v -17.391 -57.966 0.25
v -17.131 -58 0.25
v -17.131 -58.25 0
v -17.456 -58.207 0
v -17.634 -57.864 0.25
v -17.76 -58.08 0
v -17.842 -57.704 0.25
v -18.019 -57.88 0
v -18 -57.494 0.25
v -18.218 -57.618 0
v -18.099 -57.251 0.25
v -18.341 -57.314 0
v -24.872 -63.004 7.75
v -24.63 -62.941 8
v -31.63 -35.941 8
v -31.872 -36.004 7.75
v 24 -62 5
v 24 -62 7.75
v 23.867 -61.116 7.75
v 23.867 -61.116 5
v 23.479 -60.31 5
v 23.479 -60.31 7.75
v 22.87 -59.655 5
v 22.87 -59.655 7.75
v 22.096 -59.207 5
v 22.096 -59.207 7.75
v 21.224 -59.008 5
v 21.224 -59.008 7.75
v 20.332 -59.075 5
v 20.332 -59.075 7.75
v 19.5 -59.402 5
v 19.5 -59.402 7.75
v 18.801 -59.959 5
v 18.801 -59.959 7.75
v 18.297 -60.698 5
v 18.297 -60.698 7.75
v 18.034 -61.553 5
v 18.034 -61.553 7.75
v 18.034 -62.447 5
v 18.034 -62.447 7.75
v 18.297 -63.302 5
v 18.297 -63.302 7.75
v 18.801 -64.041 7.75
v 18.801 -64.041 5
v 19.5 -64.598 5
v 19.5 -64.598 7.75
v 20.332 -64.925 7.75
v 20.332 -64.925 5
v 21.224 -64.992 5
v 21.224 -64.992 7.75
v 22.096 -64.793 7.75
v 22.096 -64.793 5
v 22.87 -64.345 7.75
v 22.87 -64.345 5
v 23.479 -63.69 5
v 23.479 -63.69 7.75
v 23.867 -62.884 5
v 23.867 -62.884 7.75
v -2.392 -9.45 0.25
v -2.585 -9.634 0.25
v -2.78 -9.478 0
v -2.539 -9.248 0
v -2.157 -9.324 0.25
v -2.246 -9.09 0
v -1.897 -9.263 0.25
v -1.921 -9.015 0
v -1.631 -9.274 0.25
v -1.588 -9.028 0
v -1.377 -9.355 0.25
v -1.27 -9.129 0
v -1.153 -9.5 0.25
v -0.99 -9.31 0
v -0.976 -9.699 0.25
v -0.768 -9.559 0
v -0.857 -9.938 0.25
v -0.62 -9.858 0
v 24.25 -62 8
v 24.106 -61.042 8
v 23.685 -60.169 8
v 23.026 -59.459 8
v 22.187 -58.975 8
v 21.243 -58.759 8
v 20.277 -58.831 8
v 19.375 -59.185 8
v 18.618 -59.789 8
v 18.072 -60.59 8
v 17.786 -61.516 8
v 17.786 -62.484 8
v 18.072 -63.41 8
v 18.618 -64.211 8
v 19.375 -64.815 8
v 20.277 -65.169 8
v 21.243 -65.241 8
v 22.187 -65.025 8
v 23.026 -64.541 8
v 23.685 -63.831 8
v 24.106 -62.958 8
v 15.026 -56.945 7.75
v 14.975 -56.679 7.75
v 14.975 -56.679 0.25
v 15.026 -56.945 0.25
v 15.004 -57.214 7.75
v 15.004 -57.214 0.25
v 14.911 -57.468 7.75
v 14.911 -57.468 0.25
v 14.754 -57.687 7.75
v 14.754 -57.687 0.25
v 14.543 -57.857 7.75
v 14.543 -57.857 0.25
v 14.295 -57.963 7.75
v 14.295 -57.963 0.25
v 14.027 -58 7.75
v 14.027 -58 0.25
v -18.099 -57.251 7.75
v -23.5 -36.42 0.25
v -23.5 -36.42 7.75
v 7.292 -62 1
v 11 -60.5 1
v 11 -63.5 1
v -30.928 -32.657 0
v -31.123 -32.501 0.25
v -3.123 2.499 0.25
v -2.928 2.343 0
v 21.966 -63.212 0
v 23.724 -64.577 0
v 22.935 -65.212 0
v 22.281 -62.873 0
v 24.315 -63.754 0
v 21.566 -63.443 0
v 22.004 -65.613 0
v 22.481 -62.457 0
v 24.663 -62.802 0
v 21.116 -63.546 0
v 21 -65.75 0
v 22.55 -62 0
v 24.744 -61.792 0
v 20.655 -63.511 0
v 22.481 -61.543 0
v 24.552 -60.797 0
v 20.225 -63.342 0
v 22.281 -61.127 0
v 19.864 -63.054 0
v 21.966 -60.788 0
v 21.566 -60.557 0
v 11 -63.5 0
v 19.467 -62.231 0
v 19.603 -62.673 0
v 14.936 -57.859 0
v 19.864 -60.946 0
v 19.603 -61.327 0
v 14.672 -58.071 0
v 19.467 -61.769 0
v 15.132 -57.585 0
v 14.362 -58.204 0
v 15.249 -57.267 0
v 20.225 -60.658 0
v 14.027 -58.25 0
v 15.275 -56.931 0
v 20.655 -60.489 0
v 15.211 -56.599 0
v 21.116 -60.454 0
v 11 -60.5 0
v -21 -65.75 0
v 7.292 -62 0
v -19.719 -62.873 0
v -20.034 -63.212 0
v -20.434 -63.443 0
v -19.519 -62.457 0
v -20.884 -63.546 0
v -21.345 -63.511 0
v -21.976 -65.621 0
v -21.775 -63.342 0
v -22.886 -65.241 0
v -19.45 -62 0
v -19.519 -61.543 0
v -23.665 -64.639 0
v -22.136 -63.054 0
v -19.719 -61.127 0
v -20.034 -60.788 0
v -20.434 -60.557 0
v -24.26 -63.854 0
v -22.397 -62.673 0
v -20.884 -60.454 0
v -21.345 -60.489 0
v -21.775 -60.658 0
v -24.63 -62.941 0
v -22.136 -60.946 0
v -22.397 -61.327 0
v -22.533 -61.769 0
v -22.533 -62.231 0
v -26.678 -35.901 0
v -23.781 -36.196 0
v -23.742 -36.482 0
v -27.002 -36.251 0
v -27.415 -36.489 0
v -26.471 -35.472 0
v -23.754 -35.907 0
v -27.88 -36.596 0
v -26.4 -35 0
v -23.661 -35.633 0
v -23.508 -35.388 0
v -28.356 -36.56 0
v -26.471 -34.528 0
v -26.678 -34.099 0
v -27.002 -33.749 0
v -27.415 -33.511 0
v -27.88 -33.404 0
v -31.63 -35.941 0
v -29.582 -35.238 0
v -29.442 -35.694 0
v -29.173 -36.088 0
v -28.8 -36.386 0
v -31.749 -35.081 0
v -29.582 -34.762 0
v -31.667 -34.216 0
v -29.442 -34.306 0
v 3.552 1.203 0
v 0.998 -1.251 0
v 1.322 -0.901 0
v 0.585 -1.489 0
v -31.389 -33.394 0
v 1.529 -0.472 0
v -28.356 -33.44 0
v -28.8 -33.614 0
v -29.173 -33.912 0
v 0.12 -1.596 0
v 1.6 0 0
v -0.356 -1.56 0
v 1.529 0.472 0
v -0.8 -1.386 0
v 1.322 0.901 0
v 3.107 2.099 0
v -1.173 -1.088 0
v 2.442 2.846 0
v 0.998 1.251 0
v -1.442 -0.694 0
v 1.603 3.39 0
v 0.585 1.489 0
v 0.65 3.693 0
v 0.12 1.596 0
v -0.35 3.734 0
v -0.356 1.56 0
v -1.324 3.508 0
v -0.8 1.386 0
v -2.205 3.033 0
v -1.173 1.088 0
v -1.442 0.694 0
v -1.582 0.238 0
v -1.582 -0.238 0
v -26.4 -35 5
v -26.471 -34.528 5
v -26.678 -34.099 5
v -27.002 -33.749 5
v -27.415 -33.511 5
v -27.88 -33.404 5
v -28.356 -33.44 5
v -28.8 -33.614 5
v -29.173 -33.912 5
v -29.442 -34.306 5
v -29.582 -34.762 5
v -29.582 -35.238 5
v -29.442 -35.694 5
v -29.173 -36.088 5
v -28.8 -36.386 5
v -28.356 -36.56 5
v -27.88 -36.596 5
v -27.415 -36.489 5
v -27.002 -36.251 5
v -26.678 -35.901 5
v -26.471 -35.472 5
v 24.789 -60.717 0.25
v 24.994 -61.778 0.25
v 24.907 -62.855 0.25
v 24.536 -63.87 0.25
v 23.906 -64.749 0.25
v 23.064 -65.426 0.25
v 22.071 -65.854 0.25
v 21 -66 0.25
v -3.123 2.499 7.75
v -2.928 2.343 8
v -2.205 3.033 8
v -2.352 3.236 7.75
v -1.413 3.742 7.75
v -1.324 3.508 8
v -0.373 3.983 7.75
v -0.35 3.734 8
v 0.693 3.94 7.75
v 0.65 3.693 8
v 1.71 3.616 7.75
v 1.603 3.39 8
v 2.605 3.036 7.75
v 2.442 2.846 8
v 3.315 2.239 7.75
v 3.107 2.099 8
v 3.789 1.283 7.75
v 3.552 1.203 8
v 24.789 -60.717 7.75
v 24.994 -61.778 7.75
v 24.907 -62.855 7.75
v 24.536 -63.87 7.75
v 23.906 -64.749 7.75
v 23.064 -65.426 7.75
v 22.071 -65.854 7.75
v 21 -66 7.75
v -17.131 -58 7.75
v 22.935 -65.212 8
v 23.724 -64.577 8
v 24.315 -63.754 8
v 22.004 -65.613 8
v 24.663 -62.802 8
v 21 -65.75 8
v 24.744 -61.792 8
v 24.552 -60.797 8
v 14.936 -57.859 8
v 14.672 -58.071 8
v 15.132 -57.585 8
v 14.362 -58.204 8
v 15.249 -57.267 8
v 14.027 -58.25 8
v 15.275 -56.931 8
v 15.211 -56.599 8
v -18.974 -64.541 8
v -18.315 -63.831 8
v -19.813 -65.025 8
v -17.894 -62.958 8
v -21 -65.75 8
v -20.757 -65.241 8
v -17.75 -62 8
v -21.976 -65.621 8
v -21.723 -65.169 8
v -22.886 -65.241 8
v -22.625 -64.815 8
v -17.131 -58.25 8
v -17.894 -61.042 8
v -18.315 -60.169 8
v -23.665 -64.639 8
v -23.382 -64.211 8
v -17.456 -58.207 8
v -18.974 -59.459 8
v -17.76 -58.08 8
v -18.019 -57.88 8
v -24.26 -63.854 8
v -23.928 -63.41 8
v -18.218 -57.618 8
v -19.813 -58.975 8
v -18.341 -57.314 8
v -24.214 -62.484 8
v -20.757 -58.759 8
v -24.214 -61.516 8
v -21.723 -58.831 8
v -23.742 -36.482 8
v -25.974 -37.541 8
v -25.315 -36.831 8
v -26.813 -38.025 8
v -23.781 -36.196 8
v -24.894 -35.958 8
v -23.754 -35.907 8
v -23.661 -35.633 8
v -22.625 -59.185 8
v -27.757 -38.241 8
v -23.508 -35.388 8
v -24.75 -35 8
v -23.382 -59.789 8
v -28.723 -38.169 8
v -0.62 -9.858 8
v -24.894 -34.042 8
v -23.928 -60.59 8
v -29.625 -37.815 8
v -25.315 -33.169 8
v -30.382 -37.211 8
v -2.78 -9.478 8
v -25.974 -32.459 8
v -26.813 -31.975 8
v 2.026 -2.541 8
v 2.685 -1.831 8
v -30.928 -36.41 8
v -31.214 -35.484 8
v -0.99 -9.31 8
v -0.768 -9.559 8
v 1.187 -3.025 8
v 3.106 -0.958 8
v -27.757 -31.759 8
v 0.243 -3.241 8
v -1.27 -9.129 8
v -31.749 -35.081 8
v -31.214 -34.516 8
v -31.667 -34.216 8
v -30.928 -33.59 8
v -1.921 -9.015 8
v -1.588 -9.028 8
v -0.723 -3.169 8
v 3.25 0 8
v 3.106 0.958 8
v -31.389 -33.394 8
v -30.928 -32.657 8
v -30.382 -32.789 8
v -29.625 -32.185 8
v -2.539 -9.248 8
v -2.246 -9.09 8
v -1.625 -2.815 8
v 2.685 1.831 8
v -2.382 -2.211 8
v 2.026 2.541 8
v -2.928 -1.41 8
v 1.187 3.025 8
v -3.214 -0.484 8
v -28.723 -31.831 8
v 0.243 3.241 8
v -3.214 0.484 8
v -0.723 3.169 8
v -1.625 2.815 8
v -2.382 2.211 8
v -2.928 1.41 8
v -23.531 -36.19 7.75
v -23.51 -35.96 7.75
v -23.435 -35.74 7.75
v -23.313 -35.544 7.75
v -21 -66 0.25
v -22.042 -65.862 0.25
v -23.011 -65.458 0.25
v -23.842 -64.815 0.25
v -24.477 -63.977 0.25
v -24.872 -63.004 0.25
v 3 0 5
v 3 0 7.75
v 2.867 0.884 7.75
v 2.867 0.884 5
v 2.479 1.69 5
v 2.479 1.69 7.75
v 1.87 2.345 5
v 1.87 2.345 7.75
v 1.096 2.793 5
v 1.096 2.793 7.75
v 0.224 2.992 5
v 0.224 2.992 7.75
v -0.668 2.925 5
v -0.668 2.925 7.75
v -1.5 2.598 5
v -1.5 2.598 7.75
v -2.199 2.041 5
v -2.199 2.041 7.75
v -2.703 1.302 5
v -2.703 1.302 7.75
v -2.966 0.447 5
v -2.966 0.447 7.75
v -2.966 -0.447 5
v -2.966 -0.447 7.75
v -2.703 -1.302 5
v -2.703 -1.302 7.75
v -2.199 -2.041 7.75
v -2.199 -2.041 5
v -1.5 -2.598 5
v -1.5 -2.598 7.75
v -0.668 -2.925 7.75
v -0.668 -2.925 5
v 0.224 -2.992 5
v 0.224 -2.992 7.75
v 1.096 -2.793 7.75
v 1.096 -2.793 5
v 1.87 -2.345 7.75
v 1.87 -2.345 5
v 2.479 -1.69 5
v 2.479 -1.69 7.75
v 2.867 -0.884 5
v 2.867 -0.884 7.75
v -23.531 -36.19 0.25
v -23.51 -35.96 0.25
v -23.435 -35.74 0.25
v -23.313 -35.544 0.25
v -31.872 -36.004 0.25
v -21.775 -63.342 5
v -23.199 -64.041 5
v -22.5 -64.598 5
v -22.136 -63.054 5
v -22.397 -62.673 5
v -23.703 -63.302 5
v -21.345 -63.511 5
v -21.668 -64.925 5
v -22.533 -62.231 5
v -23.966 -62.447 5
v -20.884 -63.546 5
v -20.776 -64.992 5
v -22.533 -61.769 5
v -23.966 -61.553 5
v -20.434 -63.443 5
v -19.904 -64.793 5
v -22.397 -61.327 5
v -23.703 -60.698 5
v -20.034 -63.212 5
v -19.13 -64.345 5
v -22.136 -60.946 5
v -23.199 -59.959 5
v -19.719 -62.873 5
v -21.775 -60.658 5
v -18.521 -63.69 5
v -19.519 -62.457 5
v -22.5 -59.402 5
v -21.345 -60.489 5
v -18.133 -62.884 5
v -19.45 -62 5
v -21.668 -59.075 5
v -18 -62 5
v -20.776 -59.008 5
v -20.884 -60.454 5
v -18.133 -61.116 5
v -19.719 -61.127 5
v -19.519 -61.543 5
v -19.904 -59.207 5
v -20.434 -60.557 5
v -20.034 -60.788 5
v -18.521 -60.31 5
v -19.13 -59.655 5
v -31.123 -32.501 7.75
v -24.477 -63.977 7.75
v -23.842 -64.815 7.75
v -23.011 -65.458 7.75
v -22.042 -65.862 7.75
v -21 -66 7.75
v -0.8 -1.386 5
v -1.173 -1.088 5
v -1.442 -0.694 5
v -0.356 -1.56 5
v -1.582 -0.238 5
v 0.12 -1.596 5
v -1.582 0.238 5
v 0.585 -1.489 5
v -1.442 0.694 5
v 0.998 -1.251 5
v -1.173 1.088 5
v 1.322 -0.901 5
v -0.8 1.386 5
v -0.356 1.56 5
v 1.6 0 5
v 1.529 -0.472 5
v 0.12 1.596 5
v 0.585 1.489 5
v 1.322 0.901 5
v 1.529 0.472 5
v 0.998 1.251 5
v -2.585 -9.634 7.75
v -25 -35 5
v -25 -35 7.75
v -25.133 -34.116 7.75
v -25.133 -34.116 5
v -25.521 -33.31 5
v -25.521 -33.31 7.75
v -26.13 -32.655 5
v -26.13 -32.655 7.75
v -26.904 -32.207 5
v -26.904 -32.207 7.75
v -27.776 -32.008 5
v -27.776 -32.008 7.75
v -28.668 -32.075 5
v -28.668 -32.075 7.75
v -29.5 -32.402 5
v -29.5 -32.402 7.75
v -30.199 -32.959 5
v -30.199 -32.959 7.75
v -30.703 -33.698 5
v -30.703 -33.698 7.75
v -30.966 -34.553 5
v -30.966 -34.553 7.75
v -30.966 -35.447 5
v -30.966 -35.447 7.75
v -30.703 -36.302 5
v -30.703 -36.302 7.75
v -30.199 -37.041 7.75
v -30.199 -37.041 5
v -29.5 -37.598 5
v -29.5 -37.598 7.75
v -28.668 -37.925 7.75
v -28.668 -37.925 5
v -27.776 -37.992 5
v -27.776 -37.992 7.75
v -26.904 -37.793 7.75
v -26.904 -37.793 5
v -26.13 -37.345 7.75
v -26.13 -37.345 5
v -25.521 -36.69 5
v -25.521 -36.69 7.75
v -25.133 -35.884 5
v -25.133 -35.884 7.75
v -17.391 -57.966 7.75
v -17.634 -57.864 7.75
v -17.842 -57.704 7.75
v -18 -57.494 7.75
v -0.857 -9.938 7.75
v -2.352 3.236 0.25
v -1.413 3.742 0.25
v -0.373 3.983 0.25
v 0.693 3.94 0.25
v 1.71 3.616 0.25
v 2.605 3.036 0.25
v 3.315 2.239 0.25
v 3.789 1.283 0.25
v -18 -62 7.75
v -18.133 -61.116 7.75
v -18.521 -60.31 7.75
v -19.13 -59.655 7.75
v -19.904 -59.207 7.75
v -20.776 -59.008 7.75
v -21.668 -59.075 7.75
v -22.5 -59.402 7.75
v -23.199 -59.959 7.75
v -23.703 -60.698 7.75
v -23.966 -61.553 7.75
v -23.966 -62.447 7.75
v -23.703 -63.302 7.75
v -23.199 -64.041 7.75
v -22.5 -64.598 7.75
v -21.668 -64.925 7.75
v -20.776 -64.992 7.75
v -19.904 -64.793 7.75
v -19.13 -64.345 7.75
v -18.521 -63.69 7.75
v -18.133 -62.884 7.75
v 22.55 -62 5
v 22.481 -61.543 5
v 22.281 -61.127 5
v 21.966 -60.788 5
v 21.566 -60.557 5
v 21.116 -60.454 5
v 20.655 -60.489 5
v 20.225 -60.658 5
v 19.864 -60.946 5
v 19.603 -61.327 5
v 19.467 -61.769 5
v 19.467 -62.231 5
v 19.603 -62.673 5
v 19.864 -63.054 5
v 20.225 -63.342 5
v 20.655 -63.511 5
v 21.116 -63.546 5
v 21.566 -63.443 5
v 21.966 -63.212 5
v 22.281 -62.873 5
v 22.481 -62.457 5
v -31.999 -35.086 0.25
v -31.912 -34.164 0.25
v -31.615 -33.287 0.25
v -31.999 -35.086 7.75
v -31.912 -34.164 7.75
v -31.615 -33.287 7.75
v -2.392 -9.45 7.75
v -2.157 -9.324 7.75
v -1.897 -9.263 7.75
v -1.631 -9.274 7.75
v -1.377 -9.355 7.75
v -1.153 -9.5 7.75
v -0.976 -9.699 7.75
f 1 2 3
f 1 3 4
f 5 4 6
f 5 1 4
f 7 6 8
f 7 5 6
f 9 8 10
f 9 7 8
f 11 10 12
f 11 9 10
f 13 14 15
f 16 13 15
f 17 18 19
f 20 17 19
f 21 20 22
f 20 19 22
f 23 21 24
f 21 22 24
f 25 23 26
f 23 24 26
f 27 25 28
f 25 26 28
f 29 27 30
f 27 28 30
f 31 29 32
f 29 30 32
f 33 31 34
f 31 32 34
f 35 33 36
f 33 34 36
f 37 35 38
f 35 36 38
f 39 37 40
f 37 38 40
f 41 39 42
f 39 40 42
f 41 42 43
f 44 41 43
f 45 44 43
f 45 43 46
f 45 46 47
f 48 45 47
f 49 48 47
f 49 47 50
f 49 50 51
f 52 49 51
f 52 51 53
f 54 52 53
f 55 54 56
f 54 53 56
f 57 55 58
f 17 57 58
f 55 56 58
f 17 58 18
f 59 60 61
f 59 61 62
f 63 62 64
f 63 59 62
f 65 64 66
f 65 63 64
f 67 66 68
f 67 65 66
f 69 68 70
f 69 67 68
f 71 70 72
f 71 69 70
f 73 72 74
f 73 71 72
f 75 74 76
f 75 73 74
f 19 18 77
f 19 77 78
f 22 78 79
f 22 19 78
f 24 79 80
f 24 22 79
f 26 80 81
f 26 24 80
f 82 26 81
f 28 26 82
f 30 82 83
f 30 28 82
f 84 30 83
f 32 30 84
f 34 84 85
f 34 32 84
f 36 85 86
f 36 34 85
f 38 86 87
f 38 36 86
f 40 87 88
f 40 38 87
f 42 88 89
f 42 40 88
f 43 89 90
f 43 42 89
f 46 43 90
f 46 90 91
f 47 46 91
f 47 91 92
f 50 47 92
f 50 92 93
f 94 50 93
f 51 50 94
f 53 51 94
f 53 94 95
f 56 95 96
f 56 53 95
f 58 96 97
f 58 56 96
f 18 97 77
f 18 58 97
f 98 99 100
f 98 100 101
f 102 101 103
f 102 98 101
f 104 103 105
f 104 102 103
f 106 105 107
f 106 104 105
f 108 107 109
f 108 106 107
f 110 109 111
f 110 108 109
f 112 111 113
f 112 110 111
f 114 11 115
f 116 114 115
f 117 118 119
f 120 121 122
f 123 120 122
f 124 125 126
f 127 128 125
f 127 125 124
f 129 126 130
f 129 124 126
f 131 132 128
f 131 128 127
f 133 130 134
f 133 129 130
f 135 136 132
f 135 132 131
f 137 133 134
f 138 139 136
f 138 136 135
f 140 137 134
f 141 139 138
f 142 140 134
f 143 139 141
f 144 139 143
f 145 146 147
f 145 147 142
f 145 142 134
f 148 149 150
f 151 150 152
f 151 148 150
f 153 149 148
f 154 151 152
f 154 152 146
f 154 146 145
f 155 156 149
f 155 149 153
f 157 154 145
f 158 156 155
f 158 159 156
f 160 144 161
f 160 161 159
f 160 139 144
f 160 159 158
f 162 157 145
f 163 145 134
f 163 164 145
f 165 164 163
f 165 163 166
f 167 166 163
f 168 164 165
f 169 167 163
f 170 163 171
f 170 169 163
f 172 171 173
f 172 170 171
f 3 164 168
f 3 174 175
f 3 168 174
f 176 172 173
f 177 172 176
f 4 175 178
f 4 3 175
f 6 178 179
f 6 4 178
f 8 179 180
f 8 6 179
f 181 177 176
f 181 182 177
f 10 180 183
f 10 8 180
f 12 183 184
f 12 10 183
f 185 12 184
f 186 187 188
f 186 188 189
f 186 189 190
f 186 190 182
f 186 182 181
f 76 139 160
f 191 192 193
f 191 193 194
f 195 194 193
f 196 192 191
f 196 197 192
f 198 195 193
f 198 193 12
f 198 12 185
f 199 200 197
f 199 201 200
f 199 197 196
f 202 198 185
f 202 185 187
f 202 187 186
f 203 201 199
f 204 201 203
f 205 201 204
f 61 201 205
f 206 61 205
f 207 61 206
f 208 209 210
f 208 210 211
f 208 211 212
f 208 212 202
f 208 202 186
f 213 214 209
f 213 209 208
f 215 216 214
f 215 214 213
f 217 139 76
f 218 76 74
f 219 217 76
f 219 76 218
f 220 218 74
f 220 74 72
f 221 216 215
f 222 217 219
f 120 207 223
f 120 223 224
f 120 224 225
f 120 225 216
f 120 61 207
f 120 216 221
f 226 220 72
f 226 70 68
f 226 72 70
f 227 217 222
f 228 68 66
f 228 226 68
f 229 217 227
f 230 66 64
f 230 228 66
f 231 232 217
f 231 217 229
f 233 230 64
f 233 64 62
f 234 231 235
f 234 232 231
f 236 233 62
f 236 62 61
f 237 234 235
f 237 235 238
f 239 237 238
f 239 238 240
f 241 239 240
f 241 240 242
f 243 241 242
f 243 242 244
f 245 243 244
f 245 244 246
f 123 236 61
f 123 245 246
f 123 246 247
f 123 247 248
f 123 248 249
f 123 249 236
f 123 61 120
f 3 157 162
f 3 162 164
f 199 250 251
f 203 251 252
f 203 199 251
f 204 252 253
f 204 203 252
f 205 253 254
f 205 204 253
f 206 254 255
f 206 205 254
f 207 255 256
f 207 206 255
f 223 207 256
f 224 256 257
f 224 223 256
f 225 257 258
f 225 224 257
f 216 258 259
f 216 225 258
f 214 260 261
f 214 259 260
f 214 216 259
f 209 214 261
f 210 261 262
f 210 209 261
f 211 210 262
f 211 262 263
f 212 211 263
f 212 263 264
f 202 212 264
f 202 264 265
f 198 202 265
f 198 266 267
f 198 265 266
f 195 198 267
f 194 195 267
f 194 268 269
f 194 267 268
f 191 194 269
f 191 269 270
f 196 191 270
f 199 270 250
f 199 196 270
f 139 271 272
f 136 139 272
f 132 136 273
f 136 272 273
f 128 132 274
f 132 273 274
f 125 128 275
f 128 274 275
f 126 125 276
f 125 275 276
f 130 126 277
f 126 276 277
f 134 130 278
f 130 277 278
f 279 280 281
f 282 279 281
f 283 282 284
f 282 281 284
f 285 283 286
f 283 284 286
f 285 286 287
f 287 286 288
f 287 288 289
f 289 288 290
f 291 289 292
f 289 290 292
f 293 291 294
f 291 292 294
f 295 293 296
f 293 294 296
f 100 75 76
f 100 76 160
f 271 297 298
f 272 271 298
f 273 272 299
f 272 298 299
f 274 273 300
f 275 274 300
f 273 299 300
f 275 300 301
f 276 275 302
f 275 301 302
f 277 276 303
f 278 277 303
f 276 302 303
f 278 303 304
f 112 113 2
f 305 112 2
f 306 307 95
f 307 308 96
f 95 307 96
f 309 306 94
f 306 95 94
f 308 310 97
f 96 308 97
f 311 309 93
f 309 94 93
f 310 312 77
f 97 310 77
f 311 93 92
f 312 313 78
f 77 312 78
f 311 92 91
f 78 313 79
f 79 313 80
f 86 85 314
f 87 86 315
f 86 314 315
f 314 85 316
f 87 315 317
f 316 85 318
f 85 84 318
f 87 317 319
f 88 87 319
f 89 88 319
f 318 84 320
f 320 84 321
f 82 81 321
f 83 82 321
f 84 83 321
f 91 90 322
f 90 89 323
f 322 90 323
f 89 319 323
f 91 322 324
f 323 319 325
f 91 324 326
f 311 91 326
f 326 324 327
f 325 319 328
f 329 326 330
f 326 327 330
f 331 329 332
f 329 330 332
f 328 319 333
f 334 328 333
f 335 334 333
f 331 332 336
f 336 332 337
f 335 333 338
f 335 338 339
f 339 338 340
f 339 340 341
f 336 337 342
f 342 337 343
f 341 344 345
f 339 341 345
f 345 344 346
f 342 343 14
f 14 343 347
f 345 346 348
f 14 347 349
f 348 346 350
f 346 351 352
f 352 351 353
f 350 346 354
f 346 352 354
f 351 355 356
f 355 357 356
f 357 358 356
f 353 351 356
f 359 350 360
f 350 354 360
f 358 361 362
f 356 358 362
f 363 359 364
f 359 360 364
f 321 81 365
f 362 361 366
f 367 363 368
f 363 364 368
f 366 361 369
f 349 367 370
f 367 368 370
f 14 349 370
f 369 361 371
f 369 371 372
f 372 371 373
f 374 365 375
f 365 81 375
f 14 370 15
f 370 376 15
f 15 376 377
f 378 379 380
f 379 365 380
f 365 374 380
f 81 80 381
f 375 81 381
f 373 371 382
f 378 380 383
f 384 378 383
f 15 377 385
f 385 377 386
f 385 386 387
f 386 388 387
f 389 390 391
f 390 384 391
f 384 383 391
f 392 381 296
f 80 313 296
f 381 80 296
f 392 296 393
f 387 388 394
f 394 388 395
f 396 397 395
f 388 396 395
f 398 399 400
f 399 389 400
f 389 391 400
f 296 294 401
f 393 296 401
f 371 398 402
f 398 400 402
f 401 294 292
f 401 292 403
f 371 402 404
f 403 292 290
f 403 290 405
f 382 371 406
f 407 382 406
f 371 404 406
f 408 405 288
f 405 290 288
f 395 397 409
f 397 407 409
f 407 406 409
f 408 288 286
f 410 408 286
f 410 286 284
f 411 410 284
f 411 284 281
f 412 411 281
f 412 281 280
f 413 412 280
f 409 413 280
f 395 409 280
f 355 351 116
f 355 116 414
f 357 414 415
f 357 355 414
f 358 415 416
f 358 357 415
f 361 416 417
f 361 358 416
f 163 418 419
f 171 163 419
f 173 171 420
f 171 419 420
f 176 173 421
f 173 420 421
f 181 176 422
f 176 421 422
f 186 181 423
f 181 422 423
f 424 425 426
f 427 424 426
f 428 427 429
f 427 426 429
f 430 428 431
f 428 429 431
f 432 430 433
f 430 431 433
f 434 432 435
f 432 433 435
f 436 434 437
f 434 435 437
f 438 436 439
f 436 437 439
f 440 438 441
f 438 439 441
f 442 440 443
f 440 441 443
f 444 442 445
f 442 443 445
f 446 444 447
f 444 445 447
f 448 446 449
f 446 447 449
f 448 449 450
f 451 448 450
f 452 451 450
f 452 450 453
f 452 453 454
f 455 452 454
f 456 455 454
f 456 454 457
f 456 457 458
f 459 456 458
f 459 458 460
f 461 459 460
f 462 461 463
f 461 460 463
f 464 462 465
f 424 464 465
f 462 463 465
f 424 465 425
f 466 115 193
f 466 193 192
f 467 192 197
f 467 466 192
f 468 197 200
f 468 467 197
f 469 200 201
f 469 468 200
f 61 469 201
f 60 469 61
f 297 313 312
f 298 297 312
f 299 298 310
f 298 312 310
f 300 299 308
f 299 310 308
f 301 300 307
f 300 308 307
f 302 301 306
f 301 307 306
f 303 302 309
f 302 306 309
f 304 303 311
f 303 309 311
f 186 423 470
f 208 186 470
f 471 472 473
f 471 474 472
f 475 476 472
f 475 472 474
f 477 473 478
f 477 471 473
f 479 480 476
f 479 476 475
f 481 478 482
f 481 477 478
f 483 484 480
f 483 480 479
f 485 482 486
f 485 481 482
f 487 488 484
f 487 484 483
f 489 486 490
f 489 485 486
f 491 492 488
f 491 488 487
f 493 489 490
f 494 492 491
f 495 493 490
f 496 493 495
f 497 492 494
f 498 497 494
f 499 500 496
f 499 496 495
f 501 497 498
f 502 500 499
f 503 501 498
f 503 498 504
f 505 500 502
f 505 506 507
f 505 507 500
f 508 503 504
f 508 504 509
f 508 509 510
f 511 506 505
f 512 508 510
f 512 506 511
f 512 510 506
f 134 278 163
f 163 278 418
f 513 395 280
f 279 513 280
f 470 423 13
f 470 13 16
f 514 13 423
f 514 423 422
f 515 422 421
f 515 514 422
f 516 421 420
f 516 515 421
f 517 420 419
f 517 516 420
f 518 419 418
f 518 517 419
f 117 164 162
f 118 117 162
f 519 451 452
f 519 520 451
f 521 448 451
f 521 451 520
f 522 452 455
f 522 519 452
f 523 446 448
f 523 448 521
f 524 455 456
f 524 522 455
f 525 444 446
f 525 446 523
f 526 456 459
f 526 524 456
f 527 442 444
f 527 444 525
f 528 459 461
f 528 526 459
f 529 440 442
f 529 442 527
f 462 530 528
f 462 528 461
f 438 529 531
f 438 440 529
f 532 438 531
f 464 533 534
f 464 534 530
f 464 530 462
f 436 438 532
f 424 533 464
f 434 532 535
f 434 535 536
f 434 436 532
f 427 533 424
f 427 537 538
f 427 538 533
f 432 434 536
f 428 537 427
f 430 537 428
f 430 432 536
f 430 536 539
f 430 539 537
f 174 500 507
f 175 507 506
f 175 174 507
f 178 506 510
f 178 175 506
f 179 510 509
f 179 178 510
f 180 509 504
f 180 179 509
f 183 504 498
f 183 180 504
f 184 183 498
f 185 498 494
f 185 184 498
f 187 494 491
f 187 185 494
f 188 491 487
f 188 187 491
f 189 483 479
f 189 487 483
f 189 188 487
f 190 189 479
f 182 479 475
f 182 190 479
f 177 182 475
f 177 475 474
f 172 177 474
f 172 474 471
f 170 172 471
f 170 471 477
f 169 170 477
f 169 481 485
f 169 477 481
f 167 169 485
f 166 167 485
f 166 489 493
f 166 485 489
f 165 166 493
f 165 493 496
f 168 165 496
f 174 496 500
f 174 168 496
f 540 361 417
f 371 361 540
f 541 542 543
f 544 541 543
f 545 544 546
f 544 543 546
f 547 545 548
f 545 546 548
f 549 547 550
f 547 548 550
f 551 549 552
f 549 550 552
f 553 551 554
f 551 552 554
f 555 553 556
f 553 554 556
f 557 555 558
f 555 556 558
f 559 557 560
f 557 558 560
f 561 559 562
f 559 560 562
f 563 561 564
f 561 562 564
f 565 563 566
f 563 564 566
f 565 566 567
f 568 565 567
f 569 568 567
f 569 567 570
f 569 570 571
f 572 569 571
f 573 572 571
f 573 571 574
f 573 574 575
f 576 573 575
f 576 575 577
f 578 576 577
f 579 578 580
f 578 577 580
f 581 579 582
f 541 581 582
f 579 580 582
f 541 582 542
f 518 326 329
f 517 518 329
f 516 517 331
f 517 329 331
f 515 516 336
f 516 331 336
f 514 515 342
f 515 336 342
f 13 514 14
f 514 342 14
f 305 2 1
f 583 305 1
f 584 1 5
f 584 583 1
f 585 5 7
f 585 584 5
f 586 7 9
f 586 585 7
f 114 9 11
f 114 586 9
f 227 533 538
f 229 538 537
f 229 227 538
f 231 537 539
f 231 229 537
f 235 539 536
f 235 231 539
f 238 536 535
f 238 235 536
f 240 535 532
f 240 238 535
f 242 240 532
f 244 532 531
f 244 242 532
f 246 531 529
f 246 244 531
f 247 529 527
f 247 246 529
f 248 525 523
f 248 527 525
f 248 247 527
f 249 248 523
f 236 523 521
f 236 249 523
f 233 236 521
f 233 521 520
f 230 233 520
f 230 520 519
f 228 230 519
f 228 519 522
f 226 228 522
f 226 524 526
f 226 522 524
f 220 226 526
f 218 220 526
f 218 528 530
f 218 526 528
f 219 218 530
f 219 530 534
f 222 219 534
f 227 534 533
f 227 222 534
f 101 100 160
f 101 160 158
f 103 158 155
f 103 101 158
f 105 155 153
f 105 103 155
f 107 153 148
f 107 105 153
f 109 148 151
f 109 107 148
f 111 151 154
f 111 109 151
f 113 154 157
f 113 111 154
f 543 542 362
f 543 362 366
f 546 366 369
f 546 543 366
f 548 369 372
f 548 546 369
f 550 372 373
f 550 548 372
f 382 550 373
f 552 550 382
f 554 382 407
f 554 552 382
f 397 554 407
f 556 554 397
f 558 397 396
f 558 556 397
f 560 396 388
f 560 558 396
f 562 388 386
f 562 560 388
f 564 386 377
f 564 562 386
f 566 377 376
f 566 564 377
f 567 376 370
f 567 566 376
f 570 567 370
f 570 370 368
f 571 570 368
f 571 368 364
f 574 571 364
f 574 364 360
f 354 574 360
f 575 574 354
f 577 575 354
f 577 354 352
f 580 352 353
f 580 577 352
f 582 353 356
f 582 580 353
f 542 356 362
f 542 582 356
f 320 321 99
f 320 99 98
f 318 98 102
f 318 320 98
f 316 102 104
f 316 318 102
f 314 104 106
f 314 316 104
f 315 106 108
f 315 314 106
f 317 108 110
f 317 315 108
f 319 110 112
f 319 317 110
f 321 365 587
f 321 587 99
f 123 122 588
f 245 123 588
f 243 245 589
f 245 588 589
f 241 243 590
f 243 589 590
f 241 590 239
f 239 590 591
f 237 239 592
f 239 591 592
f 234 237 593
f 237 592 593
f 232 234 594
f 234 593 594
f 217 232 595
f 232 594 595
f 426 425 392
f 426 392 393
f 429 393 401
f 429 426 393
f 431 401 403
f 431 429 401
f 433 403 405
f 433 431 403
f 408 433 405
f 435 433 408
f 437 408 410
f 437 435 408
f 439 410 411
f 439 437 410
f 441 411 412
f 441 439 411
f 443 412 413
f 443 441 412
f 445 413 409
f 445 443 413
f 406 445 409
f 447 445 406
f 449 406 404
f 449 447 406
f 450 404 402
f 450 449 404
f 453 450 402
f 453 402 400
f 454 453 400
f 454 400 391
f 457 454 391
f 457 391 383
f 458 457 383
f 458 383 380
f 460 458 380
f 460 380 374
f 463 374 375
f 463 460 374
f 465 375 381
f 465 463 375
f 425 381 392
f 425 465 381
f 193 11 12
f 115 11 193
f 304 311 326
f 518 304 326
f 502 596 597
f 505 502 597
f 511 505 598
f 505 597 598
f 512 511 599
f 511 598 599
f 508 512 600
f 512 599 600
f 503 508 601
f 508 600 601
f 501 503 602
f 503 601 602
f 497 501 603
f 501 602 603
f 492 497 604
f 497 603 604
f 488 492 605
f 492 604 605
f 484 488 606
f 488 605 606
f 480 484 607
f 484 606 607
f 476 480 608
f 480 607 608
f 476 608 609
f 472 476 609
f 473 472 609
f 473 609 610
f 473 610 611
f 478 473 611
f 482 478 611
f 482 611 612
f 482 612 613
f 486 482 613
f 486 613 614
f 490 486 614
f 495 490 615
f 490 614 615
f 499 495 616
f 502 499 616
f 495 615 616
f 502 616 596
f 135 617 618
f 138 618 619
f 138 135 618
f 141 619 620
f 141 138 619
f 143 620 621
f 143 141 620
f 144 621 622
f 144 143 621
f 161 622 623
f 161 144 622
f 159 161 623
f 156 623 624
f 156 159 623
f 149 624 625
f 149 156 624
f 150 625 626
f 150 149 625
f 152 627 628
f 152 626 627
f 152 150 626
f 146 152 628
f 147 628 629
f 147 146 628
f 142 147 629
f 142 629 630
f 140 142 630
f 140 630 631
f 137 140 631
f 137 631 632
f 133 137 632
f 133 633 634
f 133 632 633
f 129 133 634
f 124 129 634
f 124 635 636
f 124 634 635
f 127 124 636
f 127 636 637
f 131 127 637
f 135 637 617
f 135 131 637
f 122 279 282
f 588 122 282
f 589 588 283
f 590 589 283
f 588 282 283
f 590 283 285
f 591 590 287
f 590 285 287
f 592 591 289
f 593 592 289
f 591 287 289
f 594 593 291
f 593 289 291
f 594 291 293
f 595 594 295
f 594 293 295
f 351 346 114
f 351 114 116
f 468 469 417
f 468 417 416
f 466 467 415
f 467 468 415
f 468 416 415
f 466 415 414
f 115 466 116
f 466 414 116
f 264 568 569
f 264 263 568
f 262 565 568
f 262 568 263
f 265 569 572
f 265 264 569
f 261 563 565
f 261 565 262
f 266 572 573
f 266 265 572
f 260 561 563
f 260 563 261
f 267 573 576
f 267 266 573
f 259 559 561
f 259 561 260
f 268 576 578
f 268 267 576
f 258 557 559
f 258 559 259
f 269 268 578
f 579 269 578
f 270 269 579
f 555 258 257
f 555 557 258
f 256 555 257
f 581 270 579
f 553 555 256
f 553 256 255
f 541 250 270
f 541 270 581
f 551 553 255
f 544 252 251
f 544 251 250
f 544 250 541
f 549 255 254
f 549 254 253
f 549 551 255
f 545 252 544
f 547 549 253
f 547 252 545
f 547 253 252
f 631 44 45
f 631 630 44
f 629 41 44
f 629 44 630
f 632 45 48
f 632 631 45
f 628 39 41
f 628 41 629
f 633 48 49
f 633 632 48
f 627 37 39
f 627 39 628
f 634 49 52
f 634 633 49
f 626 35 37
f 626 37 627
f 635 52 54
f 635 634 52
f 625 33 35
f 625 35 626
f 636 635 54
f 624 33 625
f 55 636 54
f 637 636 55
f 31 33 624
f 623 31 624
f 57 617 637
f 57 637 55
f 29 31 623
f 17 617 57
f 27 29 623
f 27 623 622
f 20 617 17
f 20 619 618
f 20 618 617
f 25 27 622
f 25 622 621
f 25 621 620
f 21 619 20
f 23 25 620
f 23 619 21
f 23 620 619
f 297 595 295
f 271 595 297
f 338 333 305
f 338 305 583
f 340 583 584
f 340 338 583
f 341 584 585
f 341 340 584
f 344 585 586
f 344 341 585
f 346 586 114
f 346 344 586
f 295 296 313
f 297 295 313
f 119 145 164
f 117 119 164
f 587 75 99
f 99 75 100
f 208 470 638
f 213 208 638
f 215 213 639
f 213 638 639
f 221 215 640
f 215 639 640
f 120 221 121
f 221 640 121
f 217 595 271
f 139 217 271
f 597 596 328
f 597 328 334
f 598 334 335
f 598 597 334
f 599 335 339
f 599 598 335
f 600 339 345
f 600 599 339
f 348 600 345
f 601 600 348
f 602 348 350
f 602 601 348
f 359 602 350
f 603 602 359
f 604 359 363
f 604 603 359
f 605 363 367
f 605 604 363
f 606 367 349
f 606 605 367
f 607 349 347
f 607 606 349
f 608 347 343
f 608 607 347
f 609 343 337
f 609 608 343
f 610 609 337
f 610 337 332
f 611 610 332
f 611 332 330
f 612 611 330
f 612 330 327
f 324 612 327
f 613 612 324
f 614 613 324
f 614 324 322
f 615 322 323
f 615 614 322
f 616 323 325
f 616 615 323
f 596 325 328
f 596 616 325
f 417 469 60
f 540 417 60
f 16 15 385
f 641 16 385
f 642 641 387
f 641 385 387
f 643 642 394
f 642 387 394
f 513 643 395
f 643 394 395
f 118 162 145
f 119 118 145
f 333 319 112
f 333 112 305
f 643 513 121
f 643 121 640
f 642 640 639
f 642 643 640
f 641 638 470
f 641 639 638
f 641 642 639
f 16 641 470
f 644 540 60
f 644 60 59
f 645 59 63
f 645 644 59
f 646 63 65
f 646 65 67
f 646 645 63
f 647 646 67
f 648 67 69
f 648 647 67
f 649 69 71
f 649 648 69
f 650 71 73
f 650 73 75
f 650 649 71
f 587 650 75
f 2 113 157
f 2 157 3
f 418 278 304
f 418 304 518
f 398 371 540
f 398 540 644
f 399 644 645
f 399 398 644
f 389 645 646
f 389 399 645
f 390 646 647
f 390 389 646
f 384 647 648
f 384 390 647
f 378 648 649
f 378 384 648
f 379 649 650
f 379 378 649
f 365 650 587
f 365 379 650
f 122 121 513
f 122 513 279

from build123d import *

# Parameters (mm, degrees)
SZKIC1_R                    = 1.55
SZKIC1_R_2                  = 1.6
DODANIE_WYCI_GNI_CIE1_DEPTH = 8
ZAOKR_GLENIE1_R             = 4
SZKIC2_R                    = 3
WYTNIJ_WYCI_GNI_CIE1_DEPTH  = 3
ZAOKR_GLENIE2_R             = 1
SFAZOWANIE1_SIZE            = 0.25
WYTNIJ_WYCI_GNI_CIE2_DEPTH  = 1


with BuildPart() as part:
    # Szkic1 → Dodanie-wyciągnięcie1 (new body)
    with BuildSketch(Plane.XY):
        Polygon((-32.374614688, -34.065144123), (1.443331859, 8.207289062), (26.5780588, -66), (-24.095207609, -66), align=None)
        with Locations((-21, -62)):
            Circle(SZKIC1_R, mode=Mode.SUBTRACT)
        with Locations((21, -62)):
            Circle(SZKIC1_R, mode=Mode.SUBTRACT)
        Circle(SZKIC1_R_2, mode=Mode.SUBTRACT)
        with Locations((-28, -35)):
            Circle(SZKIC1_R_2, mode=Mode.SUBTRACT)
        Polygon((-23.625385312, -35.934855877), (-1.443331859, -8.207289062), (15.4219412, -58), (-17.904792391, -58), align=None, mode=Mode.SUBTRACT)
    extrude(amount=DODANIE_WYCI_GNI_CIE1_DEPTH)

    # Zaokrąglenie1
    zaokr_glenie1_edges = [part.edges().sort_by_distance(p)[0] for p in [
        (-32.374614688, -34.065144123, 4),
        (1.443331859, 8.207289062, 4),
        (26.5780588, -66, 4),
        (-24.095207609, -66, 4),
    ]]
    fillet(zaokr_glenie1_edges, radius=ZAOKR_GLENIE1_R)

    # Szkic2 → Wytnij-wyciągnięcie1 (cut)
    with BuildSketch(Plane.XY.offset(8)):
        Circle(SZKIC2_R)
        with Locations((-28, -35)):
            Circle(SZKIC2_R)
        with Locations((-21, -62)):
            Circle(SZKIC2_R)
        with Locations((21, -62)):
            Circle(SZKIC2_R)
    extrude(amount=-WYTNIJ_WYCI_GNI_CIE1_DEPTH, mode=Mode.SUBTRACT)

    # Zaokrąglenie2
    zaokr_glenie2_edges = [part.edges().sort_by_distance(p)[0] for p in [
        (-23.625385312, -35.934855877, 4),
        (-17.904792391, -58, 4),
        (15.4219412, -58, 4),
        (-1.443331859, -8.207289062, 4),
    ]]
    fillet(zaokr_glenie2_edges, radius=ZAOKR_GLENIE2_R)

    # Sfazowanie1
    sfazowanie1_edges = [part.edges().sort_by_distance(p)[0] for p in [
        (7.058775414, -33.30874863, 0),
        (7.058775414, -33.30874863, 8),
        (-20.799357962, -46.835247082, 0),
        (-20.799357962, -46.835247082, 8),
        (-12.948817041, -22.589145539, 0),
        (-12.948817041, -22.589145539, 8),
        (14.84007865, -57.582749074, 0),
        (14.84007865, -57.582749074, 8),
        (-17.742969998, -57.790873618, 0),
        (-17.742969998, -57.790873618, 8),
        (-23.509651218, -35.959588272, 0),
        (-23.509651218, -35.959588272, 8),
        (-1.630962951, -9.274224983, 0),
        (-1.630962951, -9.274224983, 8),
        (0, -66, 0),
        (0, -66, 8),
        (-28.371987593, -49.503848635, 0),
        (-17.123475238, -15.00121981, 0),
        (14.288578303, -29.716771865, 0),
        (0.692807492, 3.939545377, 0),
        (24.2506086, -64.330996296, 0),
        (-31.911678313, -34.164073702, 0),
        (-23.44791804, -65.163494471, 0),
        (-28.371987593, -49.503848635, 8),
        (14.288578303, -29.716771865, 8),
        (-17.123475238, -15.00121981, 8),
        (0.692807492, 3.939545377, 8),
        (24.2506086, -64.330996296, 8),
        (-31.911678313, -34.164073702, 8),
        (-23.44791804, -65.163494471, 8),
        (-3, 0, 8),
        (-31, -35, 8),
        (-24, -62, 8),
        (18, -62, 8),
        (-1.551781994, -58, 0),
        (-1.551781994, -58, 8),
    ]]
    chamfer(sfazowanie1_edges, length=SFAZOWANIE1_SIZE)

    # Szkic3 → Wytnij-wyciągnięcie2 (cut)
    with BuildSketch(Plane(origin=(0, 0, 0), x_dir=(-1, 0, 0), z_dir=(0, 0, -1))):
        Polygon((-11, -60.5), (-11, -63.5), (-7.291900756, -62), align=None)
    extrude(amount=-WYTNIJ_WYCI_GNI_CIE2_DEPTH, mode=Mode.SUBTRACT)


solid = part.part
